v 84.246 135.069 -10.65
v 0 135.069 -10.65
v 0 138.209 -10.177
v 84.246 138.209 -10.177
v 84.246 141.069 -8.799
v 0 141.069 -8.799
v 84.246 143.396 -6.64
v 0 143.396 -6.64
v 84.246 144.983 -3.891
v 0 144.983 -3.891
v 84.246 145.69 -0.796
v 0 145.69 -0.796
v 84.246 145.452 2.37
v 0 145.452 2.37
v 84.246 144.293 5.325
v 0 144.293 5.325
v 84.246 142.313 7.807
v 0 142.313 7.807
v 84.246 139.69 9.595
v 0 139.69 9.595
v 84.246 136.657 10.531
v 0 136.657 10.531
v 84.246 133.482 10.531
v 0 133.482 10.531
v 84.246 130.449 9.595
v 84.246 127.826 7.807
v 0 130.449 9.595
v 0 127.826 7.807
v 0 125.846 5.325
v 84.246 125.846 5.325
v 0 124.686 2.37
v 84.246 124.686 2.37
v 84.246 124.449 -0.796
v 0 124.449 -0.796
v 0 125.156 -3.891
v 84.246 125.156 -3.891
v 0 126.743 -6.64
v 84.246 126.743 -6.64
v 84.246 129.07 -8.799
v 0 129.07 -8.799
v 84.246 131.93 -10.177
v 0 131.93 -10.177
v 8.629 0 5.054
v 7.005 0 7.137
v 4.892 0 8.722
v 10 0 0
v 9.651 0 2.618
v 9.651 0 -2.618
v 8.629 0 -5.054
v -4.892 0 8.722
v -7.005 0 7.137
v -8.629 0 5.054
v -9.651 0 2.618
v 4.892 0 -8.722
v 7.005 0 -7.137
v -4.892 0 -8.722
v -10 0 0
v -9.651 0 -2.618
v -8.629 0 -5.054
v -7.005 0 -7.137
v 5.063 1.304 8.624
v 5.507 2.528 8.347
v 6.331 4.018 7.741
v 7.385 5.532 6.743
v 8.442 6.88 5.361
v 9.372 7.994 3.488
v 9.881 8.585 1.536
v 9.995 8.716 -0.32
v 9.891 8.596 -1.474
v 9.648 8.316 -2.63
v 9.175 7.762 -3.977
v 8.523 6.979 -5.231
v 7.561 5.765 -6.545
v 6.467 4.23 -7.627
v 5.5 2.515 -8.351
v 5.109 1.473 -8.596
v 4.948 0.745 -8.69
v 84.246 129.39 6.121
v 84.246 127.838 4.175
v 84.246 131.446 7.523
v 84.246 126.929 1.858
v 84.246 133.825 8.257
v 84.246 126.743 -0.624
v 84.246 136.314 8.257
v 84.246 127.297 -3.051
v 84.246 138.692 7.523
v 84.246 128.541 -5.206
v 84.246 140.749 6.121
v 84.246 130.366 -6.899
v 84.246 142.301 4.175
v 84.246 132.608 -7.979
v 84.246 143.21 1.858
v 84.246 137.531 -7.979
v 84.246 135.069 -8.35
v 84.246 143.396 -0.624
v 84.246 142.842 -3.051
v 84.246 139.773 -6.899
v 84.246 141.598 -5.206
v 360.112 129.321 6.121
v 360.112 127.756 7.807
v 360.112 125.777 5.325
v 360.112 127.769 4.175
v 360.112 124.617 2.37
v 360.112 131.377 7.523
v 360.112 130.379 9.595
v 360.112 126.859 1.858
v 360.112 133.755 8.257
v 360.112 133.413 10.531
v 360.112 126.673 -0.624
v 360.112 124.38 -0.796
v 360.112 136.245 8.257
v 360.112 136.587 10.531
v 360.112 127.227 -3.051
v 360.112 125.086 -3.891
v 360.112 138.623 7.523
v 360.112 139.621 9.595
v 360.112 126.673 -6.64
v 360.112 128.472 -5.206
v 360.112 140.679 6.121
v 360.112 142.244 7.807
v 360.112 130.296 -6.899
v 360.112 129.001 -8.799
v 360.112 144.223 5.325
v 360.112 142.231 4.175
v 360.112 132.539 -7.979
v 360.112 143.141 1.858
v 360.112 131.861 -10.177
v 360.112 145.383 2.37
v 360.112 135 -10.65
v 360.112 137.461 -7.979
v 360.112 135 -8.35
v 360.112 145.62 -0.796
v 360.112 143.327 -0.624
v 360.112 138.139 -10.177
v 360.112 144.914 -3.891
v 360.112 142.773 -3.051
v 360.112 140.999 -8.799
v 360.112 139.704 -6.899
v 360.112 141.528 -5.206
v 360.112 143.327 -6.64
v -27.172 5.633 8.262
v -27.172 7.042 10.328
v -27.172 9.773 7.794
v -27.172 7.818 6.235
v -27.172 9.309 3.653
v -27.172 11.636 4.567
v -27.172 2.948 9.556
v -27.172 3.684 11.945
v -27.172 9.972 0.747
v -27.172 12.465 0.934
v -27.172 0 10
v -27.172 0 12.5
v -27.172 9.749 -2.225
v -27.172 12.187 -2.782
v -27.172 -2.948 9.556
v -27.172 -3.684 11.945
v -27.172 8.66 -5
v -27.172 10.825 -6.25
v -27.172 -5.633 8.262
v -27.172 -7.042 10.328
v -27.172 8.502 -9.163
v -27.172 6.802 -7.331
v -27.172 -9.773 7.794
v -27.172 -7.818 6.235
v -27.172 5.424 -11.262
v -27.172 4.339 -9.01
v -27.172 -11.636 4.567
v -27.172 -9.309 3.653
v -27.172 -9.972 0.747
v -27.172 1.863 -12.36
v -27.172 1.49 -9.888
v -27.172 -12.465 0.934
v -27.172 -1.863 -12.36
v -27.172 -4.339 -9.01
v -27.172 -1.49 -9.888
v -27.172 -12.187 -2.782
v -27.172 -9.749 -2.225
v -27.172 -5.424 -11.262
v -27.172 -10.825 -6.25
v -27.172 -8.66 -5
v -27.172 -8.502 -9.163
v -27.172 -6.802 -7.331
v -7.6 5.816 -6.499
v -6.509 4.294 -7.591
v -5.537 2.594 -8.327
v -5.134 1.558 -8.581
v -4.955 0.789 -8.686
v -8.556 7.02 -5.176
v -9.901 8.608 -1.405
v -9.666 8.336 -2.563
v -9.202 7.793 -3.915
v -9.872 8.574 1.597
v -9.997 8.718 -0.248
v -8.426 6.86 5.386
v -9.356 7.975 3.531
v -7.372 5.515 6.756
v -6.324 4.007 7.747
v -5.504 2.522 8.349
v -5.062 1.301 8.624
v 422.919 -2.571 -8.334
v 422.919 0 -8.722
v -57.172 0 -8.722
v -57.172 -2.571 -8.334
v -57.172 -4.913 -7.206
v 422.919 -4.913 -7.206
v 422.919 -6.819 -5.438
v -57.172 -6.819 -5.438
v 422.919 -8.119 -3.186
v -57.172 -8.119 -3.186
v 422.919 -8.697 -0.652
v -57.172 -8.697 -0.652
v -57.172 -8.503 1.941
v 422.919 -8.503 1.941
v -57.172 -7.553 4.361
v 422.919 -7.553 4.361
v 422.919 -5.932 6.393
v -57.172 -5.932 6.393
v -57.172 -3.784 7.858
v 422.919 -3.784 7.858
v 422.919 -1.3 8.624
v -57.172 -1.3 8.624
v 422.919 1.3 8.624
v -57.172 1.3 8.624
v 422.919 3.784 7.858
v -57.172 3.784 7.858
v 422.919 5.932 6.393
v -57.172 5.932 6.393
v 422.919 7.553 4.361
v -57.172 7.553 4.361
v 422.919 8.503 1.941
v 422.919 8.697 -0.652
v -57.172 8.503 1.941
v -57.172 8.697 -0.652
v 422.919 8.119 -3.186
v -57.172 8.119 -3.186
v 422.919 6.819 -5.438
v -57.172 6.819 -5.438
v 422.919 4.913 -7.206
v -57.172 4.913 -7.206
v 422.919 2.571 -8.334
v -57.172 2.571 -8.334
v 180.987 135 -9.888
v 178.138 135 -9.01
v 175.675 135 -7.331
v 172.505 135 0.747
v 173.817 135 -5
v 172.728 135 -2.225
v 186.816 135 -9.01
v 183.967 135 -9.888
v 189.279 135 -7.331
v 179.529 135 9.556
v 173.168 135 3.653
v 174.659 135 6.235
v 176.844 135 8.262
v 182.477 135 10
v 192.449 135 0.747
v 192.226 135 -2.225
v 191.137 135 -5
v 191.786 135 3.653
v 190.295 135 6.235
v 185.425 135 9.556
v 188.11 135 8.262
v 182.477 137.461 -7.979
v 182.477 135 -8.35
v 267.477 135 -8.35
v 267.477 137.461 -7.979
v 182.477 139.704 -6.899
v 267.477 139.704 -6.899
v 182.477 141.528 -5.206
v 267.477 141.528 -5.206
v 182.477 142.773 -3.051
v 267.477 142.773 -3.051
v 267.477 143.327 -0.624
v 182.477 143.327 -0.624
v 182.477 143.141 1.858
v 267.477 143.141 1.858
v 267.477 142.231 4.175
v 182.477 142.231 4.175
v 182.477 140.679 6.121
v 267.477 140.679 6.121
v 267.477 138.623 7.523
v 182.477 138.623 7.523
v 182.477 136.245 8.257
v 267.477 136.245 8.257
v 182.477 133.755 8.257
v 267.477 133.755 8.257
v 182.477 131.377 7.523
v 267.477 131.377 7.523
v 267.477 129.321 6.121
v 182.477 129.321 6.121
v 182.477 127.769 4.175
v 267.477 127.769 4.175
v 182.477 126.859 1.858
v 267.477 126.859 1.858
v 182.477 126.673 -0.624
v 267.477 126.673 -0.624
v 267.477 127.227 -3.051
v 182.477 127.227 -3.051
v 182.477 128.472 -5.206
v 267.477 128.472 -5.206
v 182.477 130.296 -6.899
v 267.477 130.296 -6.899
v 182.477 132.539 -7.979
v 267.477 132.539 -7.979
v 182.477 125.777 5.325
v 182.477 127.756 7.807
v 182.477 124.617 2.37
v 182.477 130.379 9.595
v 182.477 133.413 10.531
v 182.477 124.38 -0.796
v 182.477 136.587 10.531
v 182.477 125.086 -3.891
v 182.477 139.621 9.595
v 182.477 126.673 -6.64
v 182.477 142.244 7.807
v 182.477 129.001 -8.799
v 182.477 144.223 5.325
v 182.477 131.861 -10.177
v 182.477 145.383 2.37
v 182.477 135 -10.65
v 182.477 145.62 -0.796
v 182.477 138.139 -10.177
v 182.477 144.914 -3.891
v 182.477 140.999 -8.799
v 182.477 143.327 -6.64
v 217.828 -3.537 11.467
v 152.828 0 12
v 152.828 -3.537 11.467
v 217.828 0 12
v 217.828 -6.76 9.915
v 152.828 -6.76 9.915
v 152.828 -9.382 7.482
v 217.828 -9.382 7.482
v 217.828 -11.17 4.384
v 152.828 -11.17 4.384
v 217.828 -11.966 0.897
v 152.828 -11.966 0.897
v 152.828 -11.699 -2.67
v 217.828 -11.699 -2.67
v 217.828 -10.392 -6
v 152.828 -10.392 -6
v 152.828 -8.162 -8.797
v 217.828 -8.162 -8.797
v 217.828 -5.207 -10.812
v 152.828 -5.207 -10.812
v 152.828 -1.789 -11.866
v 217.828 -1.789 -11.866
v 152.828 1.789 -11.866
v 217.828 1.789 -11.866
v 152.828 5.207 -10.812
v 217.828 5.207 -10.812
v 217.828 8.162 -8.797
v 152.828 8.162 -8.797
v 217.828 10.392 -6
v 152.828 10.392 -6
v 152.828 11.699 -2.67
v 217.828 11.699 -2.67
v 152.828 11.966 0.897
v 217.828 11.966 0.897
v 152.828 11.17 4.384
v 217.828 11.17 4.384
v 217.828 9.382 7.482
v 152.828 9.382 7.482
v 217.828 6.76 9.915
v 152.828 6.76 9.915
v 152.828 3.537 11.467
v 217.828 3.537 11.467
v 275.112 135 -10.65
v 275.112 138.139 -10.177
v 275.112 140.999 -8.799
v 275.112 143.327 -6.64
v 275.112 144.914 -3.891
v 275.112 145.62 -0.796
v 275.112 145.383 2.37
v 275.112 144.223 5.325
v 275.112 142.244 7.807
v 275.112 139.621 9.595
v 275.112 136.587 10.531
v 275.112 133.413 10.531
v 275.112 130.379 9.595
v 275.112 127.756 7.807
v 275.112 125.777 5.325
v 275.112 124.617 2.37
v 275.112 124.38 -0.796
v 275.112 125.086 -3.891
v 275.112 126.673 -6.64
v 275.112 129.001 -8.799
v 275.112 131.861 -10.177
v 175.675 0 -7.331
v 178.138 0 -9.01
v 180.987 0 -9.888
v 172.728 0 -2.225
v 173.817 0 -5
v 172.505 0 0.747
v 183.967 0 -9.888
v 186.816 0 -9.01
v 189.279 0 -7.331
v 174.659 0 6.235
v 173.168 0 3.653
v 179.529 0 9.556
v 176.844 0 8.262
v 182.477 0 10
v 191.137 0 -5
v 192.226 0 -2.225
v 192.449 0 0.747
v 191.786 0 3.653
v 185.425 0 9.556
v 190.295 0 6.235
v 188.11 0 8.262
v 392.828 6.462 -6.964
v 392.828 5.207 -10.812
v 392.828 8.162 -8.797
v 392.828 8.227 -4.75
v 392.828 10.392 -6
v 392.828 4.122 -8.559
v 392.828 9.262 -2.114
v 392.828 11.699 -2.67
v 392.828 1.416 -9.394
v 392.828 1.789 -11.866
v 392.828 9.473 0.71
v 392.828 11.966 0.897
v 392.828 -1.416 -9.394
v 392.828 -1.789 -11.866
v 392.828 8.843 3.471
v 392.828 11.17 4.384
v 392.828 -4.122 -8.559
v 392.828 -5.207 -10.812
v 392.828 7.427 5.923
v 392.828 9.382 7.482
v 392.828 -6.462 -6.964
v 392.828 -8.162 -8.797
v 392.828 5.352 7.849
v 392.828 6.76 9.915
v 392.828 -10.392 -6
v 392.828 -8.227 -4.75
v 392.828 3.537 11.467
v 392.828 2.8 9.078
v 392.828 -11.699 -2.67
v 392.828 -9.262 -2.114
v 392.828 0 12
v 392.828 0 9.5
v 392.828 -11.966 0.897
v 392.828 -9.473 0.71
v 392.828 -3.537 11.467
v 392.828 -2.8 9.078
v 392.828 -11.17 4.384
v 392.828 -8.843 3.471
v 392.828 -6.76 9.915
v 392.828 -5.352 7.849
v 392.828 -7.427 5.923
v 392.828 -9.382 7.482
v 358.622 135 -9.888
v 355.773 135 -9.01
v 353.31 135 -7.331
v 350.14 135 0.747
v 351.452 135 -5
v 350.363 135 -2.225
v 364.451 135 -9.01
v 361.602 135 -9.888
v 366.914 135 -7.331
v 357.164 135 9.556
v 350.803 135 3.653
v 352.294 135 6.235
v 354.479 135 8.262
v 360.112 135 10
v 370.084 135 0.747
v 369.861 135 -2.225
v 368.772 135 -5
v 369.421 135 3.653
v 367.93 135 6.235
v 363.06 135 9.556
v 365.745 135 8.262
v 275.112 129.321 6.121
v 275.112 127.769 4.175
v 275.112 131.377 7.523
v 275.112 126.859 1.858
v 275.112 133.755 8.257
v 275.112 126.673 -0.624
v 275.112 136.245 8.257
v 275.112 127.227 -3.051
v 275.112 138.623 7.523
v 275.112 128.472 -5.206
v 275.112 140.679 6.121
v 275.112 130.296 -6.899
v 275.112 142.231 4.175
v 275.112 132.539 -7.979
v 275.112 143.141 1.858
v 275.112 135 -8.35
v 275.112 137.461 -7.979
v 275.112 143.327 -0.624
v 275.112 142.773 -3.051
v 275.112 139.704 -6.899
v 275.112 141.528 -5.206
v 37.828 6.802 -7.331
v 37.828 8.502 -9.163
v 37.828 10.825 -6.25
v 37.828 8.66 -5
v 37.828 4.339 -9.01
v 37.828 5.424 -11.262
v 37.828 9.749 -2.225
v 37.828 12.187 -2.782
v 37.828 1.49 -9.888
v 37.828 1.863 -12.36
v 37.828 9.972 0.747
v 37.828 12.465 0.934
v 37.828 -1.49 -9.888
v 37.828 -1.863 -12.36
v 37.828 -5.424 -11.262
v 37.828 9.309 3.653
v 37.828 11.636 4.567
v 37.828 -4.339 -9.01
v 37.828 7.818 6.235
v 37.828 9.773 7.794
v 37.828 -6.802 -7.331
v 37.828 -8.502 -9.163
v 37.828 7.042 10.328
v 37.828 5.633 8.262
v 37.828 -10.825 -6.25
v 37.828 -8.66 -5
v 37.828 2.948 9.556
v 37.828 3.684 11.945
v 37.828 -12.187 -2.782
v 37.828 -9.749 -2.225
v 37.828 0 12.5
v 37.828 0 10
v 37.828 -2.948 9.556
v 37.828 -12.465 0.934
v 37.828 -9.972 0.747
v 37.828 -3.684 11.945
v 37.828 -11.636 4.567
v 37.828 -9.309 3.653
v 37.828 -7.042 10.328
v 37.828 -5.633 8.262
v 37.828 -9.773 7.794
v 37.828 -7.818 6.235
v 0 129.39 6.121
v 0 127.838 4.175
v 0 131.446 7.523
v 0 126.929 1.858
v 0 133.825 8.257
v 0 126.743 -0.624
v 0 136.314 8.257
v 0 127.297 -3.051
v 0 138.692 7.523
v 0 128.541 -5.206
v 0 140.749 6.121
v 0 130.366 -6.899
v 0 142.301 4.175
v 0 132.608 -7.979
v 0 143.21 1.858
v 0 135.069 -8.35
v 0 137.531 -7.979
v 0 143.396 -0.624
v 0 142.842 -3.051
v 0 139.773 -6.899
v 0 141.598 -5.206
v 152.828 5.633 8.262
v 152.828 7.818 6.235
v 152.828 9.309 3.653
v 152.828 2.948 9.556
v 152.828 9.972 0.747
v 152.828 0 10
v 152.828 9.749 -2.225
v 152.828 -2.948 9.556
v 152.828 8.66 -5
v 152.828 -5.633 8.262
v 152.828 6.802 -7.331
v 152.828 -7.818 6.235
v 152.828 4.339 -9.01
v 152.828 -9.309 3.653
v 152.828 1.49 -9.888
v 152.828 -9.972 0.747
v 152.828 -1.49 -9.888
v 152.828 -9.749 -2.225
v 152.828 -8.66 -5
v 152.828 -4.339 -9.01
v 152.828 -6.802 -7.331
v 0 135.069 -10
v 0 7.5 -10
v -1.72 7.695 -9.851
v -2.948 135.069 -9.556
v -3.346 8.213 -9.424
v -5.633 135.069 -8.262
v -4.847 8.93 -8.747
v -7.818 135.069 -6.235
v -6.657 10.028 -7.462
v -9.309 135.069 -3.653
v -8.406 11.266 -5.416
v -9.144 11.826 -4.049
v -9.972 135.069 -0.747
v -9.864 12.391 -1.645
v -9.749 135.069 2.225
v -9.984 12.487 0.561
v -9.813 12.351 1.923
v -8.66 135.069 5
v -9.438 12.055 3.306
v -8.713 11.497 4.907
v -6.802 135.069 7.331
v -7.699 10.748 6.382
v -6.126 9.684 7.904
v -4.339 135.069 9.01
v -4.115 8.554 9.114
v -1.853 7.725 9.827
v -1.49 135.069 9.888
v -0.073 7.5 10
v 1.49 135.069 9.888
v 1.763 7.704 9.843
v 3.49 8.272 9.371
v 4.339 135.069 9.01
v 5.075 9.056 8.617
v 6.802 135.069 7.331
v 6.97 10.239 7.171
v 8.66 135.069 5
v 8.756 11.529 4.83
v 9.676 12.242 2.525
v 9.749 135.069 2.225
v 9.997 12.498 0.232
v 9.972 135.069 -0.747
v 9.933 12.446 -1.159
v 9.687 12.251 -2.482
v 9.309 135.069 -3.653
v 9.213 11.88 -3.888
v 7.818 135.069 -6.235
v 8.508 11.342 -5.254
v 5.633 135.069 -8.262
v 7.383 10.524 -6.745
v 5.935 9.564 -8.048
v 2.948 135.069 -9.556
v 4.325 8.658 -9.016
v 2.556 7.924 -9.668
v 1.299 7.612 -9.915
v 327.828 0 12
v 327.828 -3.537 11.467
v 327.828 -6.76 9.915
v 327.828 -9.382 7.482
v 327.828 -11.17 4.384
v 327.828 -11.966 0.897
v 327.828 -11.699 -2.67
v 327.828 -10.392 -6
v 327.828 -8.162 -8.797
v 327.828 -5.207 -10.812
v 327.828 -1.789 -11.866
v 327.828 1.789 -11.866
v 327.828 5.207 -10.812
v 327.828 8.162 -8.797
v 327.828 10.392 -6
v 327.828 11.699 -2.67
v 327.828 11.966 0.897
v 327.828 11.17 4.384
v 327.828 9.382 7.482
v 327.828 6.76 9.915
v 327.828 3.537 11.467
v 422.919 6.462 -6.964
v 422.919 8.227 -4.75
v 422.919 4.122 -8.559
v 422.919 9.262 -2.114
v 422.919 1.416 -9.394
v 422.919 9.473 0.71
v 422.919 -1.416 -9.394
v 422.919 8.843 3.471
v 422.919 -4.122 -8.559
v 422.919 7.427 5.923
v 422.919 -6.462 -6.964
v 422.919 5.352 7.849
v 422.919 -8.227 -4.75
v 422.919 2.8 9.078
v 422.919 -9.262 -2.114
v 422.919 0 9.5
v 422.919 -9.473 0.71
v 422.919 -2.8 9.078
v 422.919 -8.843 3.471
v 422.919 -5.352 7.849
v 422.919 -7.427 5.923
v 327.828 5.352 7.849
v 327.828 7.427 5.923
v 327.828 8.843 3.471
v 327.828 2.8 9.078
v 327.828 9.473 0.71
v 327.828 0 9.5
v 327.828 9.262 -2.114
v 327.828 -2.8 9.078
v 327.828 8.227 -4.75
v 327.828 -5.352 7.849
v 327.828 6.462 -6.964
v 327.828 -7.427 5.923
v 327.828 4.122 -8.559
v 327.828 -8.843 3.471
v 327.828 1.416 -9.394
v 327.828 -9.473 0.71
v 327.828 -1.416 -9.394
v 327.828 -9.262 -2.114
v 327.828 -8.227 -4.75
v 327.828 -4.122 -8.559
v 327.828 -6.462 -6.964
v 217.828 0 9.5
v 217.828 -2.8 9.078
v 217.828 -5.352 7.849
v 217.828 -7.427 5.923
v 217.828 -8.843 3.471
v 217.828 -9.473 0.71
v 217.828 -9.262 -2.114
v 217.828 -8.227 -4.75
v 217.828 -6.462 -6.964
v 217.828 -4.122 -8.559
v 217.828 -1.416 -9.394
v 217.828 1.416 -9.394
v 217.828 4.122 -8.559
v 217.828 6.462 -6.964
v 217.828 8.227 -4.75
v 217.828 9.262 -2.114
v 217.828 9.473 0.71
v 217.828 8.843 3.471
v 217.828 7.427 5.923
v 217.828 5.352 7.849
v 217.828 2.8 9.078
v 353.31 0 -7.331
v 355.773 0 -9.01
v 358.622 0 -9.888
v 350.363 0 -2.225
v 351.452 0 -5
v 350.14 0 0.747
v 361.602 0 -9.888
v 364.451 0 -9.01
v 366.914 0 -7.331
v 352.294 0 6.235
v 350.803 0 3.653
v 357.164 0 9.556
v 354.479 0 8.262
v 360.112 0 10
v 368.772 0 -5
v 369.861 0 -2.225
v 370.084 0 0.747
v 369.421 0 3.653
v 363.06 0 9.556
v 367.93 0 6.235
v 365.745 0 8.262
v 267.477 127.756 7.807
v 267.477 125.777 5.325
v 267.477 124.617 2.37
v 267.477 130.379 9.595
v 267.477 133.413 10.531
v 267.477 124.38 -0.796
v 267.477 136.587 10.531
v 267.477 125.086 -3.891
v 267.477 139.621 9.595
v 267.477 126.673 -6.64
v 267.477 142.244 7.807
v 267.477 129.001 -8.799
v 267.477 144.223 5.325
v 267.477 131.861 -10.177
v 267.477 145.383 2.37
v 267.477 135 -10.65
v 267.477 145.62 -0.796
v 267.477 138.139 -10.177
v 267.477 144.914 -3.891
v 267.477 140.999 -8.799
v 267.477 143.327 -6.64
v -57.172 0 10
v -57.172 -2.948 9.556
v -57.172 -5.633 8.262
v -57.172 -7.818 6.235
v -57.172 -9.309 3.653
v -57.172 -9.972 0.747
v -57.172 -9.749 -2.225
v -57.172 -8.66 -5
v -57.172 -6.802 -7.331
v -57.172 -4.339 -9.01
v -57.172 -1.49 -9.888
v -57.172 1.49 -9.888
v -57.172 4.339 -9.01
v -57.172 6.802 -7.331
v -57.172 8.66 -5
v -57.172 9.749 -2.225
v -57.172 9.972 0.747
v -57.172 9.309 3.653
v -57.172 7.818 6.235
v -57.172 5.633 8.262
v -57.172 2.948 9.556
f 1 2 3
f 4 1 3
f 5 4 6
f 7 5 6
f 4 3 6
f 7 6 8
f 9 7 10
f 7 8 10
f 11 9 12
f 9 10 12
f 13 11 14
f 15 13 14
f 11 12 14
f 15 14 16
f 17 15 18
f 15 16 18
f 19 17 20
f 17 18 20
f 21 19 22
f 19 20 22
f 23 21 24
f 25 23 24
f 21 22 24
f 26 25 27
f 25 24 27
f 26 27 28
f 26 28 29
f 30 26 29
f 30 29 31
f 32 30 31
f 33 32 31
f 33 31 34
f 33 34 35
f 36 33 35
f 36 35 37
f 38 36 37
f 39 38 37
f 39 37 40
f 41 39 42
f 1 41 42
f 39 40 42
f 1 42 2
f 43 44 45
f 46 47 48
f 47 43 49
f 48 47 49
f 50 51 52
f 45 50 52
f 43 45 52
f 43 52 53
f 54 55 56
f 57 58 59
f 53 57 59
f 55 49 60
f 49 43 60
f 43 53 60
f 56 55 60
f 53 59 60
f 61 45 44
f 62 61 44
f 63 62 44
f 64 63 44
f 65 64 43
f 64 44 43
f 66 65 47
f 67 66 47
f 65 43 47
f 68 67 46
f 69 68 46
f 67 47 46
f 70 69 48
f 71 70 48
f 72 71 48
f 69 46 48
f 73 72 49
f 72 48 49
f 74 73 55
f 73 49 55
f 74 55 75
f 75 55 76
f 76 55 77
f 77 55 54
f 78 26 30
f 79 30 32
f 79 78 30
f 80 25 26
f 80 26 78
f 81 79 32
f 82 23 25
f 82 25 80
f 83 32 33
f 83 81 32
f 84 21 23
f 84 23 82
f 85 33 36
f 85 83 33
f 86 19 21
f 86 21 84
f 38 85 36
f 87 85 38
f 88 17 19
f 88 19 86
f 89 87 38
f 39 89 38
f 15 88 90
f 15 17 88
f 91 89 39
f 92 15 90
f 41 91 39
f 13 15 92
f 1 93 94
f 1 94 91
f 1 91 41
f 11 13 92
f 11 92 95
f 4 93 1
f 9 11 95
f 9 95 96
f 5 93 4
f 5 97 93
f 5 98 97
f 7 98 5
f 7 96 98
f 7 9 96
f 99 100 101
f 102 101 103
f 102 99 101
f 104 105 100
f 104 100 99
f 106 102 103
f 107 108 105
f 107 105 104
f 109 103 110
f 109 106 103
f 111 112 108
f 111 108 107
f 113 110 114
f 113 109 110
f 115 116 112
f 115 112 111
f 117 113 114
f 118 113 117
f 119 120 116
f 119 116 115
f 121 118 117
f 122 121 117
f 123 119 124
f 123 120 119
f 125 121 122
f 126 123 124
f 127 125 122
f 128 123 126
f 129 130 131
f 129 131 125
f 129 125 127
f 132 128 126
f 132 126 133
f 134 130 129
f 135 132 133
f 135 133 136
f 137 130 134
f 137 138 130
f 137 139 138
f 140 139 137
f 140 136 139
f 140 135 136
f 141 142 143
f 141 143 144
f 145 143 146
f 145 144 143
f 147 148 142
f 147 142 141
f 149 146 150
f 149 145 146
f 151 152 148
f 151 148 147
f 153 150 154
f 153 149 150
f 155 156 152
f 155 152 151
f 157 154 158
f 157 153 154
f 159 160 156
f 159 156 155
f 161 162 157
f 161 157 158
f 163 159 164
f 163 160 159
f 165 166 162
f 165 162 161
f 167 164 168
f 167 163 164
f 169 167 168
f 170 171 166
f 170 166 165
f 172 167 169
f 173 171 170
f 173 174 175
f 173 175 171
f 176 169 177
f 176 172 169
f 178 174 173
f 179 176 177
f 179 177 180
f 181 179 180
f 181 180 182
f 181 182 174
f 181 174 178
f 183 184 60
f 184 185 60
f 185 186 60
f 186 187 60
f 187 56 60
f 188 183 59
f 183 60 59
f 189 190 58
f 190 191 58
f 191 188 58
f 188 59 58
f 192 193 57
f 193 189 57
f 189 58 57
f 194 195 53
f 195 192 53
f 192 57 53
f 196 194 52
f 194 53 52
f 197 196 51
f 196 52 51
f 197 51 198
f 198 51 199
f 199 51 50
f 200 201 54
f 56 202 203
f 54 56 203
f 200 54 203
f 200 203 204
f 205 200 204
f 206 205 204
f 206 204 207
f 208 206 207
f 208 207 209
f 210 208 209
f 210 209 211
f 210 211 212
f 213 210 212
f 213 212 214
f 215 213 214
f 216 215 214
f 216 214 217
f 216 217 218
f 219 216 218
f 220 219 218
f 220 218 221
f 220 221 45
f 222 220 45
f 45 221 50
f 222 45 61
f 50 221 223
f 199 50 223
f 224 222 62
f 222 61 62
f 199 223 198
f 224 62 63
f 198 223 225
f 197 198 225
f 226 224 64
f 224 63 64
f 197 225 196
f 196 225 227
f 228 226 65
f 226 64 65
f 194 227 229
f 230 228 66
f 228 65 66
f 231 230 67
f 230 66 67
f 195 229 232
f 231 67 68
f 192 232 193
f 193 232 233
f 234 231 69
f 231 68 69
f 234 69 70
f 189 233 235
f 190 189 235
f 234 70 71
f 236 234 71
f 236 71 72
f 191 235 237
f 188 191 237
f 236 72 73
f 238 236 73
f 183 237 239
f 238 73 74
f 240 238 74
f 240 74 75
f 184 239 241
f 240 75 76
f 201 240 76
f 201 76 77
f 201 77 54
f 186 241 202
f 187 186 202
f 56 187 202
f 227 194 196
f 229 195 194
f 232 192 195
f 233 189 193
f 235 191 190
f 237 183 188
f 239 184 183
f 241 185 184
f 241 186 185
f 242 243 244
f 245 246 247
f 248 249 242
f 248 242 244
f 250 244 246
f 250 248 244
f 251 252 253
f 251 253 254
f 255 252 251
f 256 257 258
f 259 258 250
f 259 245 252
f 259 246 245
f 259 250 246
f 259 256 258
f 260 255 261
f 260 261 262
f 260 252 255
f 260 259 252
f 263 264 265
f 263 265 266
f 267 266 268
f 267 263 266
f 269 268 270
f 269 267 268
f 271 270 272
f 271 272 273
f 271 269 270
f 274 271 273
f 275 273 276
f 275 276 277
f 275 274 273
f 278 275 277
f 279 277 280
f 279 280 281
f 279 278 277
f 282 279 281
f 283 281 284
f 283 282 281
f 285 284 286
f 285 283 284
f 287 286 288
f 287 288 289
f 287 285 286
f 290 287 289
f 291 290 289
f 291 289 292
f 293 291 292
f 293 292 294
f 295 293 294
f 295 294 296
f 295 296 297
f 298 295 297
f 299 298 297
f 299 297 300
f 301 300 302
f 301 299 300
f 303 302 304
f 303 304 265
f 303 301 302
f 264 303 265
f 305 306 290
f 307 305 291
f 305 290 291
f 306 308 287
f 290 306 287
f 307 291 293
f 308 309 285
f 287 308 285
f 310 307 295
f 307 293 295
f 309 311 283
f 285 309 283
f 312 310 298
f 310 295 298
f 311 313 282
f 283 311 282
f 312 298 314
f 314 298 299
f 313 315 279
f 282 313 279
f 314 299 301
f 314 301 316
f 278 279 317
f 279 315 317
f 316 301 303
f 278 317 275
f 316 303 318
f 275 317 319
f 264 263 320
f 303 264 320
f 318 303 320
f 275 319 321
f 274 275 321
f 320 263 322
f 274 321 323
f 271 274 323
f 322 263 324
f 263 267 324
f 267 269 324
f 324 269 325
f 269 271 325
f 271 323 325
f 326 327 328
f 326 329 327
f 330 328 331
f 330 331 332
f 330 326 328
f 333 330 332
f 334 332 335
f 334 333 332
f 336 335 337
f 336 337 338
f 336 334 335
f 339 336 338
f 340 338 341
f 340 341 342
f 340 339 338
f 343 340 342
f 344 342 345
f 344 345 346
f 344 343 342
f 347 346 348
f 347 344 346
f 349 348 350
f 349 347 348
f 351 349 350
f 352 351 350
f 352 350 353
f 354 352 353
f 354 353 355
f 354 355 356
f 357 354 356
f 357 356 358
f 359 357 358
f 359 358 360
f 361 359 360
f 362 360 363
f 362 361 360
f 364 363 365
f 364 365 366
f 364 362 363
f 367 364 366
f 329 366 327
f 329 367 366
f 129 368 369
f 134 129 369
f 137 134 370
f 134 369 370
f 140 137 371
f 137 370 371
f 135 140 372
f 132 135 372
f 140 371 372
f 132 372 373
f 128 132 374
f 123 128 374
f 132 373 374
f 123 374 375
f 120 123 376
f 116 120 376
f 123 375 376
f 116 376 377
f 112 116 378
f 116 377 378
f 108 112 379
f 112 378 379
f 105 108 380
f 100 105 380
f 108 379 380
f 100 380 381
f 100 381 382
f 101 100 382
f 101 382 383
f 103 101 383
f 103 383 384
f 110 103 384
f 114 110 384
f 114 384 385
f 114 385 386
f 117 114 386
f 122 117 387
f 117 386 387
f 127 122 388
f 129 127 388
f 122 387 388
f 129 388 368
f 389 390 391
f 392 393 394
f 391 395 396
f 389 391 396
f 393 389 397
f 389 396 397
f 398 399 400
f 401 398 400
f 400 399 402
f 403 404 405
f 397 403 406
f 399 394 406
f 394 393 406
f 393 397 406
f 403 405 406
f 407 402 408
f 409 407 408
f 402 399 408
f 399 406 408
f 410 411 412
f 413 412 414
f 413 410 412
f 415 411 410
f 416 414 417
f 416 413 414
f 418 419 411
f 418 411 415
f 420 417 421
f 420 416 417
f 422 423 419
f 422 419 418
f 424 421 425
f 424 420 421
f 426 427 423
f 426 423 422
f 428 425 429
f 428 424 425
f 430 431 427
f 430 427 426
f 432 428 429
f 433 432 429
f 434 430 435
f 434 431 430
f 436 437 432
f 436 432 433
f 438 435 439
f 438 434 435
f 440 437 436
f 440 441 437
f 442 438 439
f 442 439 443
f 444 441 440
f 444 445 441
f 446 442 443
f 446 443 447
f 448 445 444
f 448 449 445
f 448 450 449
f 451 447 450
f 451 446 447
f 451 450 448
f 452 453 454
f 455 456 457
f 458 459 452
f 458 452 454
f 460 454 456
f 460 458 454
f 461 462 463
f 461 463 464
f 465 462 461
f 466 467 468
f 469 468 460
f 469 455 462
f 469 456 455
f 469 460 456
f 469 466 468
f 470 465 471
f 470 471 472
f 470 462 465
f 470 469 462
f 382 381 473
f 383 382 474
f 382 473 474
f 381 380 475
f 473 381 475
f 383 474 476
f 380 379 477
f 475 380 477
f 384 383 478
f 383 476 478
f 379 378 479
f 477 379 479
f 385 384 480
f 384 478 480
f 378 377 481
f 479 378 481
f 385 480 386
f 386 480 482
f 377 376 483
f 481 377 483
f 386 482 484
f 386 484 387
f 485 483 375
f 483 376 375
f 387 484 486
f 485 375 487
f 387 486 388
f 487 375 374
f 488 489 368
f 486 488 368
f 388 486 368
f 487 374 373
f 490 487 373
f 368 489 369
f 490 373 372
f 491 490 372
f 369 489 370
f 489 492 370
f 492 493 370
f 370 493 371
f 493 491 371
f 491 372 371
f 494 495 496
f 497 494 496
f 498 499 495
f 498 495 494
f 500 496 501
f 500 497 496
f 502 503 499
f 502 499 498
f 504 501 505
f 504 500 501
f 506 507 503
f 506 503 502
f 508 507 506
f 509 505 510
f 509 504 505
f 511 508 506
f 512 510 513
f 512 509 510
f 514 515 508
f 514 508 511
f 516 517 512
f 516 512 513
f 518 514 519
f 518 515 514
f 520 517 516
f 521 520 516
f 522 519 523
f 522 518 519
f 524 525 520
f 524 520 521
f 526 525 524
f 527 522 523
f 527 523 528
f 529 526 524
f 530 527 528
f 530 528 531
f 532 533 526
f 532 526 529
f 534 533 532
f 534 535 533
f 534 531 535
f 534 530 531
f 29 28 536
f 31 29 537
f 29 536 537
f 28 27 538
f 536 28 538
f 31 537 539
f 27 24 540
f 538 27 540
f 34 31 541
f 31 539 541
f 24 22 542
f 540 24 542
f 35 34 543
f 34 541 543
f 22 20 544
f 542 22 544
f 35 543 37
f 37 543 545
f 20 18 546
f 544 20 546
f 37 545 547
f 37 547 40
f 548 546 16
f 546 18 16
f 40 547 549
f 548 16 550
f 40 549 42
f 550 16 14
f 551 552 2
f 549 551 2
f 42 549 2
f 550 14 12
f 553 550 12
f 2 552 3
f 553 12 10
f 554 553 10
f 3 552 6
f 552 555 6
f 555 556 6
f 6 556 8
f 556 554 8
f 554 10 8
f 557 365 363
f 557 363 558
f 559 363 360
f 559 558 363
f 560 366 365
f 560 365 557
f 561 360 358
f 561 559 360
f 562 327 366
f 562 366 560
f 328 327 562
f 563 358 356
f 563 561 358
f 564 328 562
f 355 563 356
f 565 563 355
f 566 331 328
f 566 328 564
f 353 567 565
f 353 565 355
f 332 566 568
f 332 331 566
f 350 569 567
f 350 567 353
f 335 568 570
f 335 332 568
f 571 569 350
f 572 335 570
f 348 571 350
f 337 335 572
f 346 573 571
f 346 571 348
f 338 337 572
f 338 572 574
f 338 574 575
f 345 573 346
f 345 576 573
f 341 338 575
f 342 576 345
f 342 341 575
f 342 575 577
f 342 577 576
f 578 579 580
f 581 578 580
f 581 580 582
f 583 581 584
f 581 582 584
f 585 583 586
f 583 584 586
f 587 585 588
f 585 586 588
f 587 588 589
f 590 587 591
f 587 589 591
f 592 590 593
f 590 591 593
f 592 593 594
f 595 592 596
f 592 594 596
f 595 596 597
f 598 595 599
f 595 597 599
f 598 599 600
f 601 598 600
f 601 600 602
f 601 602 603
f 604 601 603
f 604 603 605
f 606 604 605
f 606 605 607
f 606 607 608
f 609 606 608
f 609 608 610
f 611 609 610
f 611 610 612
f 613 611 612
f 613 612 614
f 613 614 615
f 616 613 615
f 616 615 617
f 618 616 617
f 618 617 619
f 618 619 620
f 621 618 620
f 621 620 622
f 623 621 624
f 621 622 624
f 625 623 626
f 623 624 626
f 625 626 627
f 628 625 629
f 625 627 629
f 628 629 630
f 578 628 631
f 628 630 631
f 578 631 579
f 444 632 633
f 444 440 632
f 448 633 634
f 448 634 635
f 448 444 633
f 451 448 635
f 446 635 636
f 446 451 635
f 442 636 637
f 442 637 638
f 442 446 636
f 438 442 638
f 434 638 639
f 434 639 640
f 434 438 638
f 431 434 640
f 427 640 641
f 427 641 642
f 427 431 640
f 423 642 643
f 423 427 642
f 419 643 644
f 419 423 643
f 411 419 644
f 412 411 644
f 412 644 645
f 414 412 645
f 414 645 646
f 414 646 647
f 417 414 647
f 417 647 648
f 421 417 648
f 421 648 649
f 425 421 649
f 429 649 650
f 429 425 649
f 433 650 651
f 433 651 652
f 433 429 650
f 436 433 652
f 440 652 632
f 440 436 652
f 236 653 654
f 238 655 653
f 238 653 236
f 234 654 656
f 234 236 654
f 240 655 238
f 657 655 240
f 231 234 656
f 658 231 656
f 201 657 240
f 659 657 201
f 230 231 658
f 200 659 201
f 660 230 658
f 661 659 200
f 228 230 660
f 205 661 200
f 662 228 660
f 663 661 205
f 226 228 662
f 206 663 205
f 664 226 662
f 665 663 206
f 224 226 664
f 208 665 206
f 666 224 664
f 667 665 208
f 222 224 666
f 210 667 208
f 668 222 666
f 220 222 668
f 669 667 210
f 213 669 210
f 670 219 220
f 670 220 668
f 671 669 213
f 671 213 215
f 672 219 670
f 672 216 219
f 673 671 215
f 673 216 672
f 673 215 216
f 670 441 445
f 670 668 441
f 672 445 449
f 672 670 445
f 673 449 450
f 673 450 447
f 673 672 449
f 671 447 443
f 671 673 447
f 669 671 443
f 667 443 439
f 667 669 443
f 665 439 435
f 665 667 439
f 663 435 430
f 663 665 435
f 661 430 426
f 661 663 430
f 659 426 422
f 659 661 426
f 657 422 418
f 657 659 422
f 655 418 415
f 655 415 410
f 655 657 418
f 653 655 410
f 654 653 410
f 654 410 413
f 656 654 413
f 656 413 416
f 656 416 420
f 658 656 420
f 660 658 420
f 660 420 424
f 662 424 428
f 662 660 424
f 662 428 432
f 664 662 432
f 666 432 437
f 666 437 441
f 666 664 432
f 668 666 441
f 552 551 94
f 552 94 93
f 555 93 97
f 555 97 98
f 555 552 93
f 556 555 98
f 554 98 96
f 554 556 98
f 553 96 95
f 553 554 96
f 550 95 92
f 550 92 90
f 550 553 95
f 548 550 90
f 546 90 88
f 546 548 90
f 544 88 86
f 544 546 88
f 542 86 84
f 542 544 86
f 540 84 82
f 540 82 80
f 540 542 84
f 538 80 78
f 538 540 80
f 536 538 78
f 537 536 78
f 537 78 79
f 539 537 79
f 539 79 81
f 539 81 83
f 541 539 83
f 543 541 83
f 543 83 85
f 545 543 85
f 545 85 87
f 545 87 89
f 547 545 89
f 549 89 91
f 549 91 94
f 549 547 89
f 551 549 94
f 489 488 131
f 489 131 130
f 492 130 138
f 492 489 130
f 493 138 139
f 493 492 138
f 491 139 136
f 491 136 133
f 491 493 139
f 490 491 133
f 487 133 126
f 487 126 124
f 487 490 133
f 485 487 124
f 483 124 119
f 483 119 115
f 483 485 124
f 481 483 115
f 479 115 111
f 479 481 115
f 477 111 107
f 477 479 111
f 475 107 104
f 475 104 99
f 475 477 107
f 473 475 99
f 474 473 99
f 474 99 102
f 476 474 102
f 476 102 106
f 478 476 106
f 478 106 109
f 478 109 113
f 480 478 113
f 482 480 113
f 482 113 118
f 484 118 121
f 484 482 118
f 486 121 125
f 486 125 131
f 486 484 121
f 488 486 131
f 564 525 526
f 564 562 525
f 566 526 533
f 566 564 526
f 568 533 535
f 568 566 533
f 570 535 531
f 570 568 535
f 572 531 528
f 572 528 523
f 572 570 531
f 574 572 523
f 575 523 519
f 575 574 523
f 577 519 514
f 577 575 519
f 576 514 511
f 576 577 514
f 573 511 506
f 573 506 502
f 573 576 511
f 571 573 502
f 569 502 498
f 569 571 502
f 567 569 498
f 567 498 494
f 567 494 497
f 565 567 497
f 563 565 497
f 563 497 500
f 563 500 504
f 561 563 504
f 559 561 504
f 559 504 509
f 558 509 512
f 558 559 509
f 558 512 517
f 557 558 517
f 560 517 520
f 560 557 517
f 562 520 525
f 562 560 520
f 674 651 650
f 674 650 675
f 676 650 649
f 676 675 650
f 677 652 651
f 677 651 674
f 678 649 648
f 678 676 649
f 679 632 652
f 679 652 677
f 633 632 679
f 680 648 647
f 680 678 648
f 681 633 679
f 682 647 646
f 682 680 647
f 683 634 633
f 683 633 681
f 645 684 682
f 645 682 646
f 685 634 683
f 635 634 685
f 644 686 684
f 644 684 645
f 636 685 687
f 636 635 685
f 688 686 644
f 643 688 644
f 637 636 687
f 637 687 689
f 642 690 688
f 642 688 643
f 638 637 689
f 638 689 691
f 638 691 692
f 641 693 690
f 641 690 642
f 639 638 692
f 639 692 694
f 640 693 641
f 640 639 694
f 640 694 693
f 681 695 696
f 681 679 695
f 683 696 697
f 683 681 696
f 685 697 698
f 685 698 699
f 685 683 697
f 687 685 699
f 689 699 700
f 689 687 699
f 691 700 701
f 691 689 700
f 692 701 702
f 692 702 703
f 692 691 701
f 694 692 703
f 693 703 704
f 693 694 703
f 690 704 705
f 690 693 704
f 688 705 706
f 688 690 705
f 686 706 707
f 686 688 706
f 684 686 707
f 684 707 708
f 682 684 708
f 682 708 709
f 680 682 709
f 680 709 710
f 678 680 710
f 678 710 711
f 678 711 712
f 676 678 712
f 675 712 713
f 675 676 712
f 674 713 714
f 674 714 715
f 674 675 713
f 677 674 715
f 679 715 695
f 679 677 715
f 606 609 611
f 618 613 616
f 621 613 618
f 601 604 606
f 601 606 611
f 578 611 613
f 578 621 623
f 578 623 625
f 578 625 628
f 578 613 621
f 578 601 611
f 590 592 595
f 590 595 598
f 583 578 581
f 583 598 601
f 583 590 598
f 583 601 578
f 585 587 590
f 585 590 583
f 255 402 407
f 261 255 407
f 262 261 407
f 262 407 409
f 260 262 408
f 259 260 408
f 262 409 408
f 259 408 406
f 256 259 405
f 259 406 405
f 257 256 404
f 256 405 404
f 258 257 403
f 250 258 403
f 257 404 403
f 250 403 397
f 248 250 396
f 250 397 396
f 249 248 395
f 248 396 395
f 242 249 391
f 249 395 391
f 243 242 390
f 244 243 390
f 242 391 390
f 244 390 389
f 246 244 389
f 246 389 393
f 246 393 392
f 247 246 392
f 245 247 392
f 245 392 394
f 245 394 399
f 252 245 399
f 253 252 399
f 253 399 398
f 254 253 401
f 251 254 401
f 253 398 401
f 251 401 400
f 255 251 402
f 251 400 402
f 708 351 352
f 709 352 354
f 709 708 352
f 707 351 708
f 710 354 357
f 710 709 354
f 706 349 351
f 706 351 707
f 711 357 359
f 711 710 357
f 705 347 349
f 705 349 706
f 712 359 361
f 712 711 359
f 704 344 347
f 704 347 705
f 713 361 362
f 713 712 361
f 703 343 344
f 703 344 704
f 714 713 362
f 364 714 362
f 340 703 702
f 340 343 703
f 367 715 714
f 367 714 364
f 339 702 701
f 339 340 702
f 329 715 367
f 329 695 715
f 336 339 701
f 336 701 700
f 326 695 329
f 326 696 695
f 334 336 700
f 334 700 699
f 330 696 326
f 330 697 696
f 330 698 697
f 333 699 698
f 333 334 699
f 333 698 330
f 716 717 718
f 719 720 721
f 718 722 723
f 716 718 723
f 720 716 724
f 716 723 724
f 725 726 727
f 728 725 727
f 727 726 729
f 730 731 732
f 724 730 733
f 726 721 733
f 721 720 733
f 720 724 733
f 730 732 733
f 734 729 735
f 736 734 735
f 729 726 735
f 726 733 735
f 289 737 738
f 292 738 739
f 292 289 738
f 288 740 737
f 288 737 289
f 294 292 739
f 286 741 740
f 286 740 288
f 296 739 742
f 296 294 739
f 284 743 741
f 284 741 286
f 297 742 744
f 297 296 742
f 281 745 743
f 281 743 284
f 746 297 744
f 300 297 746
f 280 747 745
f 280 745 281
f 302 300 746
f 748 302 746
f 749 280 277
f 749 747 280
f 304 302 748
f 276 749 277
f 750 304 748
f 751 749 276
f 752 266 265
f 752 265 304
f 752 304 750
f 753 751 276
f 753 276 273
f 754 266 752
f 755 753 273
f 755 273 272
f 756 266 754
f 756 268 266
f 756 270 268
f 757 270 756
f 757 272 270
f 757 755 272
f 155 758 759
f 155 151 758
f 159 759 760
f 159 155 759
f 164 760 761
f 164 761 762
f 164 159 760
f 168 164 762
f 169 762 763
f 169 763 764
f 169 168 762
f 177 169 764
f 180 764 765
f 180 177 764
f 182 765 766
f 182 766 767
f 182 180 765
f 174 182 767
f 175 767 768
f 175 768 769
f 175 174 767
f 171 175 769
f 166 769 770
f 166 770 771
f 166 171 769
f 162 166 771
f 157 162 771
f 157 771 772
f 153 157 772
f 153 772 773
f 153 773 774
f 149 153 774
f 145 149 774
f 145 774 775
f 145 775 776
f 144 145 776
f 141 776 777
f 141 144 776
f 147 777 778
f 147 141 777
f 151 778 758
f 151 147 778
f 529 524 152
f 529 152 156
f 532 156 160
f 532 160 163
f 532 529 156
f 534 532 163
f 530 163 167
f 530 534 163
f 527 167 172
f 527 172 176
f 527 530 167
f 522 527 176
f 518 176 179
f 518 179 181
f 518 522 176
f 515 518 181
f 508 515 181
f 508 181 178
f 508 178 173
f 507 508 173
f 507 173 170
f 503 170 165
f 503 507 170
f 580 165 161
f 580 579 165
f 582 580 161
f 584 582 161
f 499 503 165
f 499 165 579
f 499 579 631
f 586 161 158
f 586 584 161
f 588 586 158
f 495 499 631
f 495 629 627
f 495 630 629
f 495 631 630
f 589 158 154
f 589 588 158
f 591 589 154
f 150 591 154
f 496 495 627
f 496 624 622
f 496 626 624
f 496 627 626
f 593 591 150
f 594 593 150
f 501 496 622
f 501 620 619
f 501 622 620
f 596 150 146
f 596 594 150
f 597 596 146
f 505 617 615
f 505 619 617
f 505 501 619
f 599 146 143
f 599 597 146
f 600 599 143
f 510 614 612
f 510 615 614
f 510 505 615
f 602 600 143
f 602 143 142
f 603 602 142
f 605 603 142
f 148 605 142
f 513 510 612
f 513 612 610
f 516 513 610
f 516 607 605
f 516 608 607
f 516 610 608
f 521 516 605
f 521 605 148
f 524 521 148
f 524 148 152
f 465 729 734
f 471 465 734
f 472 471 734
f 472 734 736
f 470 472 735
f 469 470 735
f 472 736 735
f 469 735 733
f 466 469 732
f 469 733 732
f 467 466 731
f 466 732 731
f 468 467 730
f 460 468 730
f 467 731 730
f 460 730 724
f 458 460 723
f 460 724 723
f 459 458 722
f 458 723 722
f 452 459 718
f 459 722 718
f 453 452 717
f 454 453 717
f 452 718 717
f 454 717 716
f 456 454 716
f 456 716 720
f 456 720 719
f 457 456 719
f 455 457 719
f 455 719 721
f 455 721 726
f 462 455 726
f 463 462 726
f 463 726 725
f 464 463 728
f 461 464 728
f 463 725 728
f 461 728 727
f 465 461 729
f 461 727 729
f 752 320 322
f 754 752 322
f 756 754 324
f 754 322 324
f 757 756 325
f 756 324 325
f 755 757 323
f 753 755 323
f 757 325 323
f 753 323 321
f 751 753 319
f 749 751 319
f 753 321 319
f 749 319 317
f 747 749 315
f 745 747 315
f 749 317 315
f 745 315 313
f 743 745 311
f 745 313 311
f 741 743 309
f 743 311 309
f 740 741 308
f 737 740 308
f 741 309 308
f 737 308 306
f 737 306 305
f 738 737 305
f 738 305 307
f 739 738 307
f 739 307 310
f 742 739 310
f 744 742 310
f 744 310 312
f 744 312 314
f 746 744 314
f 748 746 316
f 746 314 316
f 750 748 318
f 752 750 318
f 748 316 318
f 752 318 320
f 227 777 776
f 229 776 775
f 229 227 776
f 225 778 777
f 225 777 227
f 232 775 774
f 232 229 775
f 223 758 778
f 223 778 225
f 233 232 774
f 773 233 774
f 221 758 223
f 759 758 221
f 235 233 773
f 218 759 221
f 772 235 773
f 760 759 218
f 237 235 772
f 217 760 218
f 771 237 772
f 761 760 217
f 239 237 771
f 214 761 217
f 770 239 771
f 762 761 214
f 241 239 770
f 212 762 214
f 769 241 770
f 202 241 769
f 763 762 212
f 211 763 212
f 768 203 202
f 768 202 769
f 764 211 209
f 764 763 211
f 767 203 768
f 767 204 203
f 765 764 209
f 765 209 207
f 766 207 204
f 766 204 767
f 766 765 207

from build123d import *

# Parameters (mm, degrees)
SKETCH3_R                  = 8.721666083
CUT_EXTRUDE2_DEPTH         = 480
CUT_EXTRUDE2_DEPTH_BACK    = 500
SKETCH6_R                  = 10
BOSS_EXTRUDE1_DEPTH        = 135.069363488
SKETCH11_R                 = 10.65
SKETCH11_R_2               = 8.35
STRUCTURAL_MEMBER1_DEPTH   = 84.246035782
SKETCH13_R                 = 10
BOSS_EXTRUDE2_DEPTH        = 135
BOSS_EXTRUDE2_2_DEPTH      = 135
SKETCH12_R                 = 10.65
SKETCH12_R_2               = 8.35
STRUCTURAL_MEMBER2_DEPTH   = 85
SKETCH12_ON_SEGMENT_2_R    = 10.65
SKETCH12_ON_SEGMENT_2_R_2  = 8.35
STRUCTURAL_MEMBER2_2_DEPTH = 85


with BuildPart() as part:
    # Sketch1 → Revolve3 (revolve)
    with BuildSketch(Plane.XY, mode=Mode.PRIVATE) as revolve3_sk:
        Polygon((-57.171934505, 0), (-57.171934505, 10), (-27.171934505, 10), (-27.171934505, 12.5), (37.828065495, 12.5), (37.828065495, 10), (152.828065495, 10), (152.828065495, 12), (217.828065495, 12), (217.828065495, 9.5), (327.828065495, 9.5), (327.828065495, 12), (392.828065495, 12), (392.828065495, 9.5), (422.918888311, 9.5), (422.918888311, 0), align=None)
    revolve(revolve3_sk.sketch.rotate(Axis((-63.851816887, 0, 0), (1, 0, 0)), 90), axis=Axis((-63.851816887, 0, 0), (1, 0, 0)))

    # Sketch3 → Cut-Extrude2 (cut, two sides)
    with BuildSketch(Plane.ZY.offset(57.171934505)) as cut_extrude2_sk:
        with Locations(Location((0, 0, 0), (0, 0, 180))):
            Circle(SKETCH3_R)
    extrude(amount=CUT_EXTRUDE2_DEPTH, mode=Mode.SUBTRACT)
    extrude(cut_extrude2_sk.sketch, amount=-CUT_EXTRUDE2_DEPTH_BACK, mode=Mode.SUBTRACT)

    # Sketch6 → Boss-Extrude1 (add)
    with BuildSketch(Plane(origin=(0, 0, 0), x_dir=(1, 0, 0), z_dir=(0, 1, 0))):
        with Locations(Location((0, 0, 0), (0, 0, 90))):
            Circle(SKETCH6_R)
    extrude(amount=BOSS_EXTRUDE1_DEPTH)


with BuildPart() as body_2:
    # Sketch11 → Structural Member1 (new body)
    with BuildSketch(Plane(origin=(0, 135.069363488, 0), x_dir=(0, 0, -1), z_dir=(1, 0, 0))):
        Circle(SKETCH11_R)
        Circle(SKETCH11_R_2, mode=Mode.SUBTRACT)
    extrude(amount=STRUCTURAL_MEMBER1_DEPTH)


with BuildPart() as body_3:
    # Sketch13 → Boss-Extrude2 (new body)
    with BuildSketch(Plane(origin=(0, 0, 0), x_dir=(1, 0, 0), z_dir=(0, 1, 0))):
        with Locations(Location((182.476970148, 0, 0), (0, 0, 270))):
            Circle(SKETCH13_R)
    extrude(amount=BOSS_EXTRUDE2_DEPTH)


with BuildPart() as body_4:
    # Sketch13 → Boss-Extrude2 2 (new body)
    with BuildSketch(Plane(origin=(0, 0, 0), x_dir=(1, 0, 0), z_dir=(0, 1, 0))):
        with Locations(Location((360.111996239, 0, 0), (0, 0, 270))):
            Circle(SKETCH13_R)
    extrude(amount=BOSS_EXTRUDE2_2_DEPTH)


with BuildPart() as body_5:
    # Sketch12 → Structural Member2 (new body)
    with BuildSketch(Plane(origin=(182.476970148, 135, 0), x_dir=(0, 0, -1), z_dir=(1, 0, 0))):
        Circle(SKETCH12_R)
        Circle(SKETCH12_R_2, mode=Mode.SUBTRACT)
    extrude(amount=STRUCTURAL_MEMBER2_DEPTH)


with BuildPart() as body_6:
    # Sketch12 on segment 2 (carried to segment 2) → Structural Member2 2 (new body)
    with BuildSketch(Plane(origin=(275.111996239, 135, 0), x_dir=(0, 0, -1), z_dir=(1, 0, 0))):
        Circle(SKETCH12_ON_SEGMENT_2_R)
        Circle(SKETCH12_ON_SEGMENT_2_R_2, mode=Mode.SUBTRACT)
    extrude(amount=STRUCTURAL_MEMBER2_2_DEPTH)


solid = Compound([part.part, body_2.part, body_3.part, body_4.part, body_5.part, body_6.part])
